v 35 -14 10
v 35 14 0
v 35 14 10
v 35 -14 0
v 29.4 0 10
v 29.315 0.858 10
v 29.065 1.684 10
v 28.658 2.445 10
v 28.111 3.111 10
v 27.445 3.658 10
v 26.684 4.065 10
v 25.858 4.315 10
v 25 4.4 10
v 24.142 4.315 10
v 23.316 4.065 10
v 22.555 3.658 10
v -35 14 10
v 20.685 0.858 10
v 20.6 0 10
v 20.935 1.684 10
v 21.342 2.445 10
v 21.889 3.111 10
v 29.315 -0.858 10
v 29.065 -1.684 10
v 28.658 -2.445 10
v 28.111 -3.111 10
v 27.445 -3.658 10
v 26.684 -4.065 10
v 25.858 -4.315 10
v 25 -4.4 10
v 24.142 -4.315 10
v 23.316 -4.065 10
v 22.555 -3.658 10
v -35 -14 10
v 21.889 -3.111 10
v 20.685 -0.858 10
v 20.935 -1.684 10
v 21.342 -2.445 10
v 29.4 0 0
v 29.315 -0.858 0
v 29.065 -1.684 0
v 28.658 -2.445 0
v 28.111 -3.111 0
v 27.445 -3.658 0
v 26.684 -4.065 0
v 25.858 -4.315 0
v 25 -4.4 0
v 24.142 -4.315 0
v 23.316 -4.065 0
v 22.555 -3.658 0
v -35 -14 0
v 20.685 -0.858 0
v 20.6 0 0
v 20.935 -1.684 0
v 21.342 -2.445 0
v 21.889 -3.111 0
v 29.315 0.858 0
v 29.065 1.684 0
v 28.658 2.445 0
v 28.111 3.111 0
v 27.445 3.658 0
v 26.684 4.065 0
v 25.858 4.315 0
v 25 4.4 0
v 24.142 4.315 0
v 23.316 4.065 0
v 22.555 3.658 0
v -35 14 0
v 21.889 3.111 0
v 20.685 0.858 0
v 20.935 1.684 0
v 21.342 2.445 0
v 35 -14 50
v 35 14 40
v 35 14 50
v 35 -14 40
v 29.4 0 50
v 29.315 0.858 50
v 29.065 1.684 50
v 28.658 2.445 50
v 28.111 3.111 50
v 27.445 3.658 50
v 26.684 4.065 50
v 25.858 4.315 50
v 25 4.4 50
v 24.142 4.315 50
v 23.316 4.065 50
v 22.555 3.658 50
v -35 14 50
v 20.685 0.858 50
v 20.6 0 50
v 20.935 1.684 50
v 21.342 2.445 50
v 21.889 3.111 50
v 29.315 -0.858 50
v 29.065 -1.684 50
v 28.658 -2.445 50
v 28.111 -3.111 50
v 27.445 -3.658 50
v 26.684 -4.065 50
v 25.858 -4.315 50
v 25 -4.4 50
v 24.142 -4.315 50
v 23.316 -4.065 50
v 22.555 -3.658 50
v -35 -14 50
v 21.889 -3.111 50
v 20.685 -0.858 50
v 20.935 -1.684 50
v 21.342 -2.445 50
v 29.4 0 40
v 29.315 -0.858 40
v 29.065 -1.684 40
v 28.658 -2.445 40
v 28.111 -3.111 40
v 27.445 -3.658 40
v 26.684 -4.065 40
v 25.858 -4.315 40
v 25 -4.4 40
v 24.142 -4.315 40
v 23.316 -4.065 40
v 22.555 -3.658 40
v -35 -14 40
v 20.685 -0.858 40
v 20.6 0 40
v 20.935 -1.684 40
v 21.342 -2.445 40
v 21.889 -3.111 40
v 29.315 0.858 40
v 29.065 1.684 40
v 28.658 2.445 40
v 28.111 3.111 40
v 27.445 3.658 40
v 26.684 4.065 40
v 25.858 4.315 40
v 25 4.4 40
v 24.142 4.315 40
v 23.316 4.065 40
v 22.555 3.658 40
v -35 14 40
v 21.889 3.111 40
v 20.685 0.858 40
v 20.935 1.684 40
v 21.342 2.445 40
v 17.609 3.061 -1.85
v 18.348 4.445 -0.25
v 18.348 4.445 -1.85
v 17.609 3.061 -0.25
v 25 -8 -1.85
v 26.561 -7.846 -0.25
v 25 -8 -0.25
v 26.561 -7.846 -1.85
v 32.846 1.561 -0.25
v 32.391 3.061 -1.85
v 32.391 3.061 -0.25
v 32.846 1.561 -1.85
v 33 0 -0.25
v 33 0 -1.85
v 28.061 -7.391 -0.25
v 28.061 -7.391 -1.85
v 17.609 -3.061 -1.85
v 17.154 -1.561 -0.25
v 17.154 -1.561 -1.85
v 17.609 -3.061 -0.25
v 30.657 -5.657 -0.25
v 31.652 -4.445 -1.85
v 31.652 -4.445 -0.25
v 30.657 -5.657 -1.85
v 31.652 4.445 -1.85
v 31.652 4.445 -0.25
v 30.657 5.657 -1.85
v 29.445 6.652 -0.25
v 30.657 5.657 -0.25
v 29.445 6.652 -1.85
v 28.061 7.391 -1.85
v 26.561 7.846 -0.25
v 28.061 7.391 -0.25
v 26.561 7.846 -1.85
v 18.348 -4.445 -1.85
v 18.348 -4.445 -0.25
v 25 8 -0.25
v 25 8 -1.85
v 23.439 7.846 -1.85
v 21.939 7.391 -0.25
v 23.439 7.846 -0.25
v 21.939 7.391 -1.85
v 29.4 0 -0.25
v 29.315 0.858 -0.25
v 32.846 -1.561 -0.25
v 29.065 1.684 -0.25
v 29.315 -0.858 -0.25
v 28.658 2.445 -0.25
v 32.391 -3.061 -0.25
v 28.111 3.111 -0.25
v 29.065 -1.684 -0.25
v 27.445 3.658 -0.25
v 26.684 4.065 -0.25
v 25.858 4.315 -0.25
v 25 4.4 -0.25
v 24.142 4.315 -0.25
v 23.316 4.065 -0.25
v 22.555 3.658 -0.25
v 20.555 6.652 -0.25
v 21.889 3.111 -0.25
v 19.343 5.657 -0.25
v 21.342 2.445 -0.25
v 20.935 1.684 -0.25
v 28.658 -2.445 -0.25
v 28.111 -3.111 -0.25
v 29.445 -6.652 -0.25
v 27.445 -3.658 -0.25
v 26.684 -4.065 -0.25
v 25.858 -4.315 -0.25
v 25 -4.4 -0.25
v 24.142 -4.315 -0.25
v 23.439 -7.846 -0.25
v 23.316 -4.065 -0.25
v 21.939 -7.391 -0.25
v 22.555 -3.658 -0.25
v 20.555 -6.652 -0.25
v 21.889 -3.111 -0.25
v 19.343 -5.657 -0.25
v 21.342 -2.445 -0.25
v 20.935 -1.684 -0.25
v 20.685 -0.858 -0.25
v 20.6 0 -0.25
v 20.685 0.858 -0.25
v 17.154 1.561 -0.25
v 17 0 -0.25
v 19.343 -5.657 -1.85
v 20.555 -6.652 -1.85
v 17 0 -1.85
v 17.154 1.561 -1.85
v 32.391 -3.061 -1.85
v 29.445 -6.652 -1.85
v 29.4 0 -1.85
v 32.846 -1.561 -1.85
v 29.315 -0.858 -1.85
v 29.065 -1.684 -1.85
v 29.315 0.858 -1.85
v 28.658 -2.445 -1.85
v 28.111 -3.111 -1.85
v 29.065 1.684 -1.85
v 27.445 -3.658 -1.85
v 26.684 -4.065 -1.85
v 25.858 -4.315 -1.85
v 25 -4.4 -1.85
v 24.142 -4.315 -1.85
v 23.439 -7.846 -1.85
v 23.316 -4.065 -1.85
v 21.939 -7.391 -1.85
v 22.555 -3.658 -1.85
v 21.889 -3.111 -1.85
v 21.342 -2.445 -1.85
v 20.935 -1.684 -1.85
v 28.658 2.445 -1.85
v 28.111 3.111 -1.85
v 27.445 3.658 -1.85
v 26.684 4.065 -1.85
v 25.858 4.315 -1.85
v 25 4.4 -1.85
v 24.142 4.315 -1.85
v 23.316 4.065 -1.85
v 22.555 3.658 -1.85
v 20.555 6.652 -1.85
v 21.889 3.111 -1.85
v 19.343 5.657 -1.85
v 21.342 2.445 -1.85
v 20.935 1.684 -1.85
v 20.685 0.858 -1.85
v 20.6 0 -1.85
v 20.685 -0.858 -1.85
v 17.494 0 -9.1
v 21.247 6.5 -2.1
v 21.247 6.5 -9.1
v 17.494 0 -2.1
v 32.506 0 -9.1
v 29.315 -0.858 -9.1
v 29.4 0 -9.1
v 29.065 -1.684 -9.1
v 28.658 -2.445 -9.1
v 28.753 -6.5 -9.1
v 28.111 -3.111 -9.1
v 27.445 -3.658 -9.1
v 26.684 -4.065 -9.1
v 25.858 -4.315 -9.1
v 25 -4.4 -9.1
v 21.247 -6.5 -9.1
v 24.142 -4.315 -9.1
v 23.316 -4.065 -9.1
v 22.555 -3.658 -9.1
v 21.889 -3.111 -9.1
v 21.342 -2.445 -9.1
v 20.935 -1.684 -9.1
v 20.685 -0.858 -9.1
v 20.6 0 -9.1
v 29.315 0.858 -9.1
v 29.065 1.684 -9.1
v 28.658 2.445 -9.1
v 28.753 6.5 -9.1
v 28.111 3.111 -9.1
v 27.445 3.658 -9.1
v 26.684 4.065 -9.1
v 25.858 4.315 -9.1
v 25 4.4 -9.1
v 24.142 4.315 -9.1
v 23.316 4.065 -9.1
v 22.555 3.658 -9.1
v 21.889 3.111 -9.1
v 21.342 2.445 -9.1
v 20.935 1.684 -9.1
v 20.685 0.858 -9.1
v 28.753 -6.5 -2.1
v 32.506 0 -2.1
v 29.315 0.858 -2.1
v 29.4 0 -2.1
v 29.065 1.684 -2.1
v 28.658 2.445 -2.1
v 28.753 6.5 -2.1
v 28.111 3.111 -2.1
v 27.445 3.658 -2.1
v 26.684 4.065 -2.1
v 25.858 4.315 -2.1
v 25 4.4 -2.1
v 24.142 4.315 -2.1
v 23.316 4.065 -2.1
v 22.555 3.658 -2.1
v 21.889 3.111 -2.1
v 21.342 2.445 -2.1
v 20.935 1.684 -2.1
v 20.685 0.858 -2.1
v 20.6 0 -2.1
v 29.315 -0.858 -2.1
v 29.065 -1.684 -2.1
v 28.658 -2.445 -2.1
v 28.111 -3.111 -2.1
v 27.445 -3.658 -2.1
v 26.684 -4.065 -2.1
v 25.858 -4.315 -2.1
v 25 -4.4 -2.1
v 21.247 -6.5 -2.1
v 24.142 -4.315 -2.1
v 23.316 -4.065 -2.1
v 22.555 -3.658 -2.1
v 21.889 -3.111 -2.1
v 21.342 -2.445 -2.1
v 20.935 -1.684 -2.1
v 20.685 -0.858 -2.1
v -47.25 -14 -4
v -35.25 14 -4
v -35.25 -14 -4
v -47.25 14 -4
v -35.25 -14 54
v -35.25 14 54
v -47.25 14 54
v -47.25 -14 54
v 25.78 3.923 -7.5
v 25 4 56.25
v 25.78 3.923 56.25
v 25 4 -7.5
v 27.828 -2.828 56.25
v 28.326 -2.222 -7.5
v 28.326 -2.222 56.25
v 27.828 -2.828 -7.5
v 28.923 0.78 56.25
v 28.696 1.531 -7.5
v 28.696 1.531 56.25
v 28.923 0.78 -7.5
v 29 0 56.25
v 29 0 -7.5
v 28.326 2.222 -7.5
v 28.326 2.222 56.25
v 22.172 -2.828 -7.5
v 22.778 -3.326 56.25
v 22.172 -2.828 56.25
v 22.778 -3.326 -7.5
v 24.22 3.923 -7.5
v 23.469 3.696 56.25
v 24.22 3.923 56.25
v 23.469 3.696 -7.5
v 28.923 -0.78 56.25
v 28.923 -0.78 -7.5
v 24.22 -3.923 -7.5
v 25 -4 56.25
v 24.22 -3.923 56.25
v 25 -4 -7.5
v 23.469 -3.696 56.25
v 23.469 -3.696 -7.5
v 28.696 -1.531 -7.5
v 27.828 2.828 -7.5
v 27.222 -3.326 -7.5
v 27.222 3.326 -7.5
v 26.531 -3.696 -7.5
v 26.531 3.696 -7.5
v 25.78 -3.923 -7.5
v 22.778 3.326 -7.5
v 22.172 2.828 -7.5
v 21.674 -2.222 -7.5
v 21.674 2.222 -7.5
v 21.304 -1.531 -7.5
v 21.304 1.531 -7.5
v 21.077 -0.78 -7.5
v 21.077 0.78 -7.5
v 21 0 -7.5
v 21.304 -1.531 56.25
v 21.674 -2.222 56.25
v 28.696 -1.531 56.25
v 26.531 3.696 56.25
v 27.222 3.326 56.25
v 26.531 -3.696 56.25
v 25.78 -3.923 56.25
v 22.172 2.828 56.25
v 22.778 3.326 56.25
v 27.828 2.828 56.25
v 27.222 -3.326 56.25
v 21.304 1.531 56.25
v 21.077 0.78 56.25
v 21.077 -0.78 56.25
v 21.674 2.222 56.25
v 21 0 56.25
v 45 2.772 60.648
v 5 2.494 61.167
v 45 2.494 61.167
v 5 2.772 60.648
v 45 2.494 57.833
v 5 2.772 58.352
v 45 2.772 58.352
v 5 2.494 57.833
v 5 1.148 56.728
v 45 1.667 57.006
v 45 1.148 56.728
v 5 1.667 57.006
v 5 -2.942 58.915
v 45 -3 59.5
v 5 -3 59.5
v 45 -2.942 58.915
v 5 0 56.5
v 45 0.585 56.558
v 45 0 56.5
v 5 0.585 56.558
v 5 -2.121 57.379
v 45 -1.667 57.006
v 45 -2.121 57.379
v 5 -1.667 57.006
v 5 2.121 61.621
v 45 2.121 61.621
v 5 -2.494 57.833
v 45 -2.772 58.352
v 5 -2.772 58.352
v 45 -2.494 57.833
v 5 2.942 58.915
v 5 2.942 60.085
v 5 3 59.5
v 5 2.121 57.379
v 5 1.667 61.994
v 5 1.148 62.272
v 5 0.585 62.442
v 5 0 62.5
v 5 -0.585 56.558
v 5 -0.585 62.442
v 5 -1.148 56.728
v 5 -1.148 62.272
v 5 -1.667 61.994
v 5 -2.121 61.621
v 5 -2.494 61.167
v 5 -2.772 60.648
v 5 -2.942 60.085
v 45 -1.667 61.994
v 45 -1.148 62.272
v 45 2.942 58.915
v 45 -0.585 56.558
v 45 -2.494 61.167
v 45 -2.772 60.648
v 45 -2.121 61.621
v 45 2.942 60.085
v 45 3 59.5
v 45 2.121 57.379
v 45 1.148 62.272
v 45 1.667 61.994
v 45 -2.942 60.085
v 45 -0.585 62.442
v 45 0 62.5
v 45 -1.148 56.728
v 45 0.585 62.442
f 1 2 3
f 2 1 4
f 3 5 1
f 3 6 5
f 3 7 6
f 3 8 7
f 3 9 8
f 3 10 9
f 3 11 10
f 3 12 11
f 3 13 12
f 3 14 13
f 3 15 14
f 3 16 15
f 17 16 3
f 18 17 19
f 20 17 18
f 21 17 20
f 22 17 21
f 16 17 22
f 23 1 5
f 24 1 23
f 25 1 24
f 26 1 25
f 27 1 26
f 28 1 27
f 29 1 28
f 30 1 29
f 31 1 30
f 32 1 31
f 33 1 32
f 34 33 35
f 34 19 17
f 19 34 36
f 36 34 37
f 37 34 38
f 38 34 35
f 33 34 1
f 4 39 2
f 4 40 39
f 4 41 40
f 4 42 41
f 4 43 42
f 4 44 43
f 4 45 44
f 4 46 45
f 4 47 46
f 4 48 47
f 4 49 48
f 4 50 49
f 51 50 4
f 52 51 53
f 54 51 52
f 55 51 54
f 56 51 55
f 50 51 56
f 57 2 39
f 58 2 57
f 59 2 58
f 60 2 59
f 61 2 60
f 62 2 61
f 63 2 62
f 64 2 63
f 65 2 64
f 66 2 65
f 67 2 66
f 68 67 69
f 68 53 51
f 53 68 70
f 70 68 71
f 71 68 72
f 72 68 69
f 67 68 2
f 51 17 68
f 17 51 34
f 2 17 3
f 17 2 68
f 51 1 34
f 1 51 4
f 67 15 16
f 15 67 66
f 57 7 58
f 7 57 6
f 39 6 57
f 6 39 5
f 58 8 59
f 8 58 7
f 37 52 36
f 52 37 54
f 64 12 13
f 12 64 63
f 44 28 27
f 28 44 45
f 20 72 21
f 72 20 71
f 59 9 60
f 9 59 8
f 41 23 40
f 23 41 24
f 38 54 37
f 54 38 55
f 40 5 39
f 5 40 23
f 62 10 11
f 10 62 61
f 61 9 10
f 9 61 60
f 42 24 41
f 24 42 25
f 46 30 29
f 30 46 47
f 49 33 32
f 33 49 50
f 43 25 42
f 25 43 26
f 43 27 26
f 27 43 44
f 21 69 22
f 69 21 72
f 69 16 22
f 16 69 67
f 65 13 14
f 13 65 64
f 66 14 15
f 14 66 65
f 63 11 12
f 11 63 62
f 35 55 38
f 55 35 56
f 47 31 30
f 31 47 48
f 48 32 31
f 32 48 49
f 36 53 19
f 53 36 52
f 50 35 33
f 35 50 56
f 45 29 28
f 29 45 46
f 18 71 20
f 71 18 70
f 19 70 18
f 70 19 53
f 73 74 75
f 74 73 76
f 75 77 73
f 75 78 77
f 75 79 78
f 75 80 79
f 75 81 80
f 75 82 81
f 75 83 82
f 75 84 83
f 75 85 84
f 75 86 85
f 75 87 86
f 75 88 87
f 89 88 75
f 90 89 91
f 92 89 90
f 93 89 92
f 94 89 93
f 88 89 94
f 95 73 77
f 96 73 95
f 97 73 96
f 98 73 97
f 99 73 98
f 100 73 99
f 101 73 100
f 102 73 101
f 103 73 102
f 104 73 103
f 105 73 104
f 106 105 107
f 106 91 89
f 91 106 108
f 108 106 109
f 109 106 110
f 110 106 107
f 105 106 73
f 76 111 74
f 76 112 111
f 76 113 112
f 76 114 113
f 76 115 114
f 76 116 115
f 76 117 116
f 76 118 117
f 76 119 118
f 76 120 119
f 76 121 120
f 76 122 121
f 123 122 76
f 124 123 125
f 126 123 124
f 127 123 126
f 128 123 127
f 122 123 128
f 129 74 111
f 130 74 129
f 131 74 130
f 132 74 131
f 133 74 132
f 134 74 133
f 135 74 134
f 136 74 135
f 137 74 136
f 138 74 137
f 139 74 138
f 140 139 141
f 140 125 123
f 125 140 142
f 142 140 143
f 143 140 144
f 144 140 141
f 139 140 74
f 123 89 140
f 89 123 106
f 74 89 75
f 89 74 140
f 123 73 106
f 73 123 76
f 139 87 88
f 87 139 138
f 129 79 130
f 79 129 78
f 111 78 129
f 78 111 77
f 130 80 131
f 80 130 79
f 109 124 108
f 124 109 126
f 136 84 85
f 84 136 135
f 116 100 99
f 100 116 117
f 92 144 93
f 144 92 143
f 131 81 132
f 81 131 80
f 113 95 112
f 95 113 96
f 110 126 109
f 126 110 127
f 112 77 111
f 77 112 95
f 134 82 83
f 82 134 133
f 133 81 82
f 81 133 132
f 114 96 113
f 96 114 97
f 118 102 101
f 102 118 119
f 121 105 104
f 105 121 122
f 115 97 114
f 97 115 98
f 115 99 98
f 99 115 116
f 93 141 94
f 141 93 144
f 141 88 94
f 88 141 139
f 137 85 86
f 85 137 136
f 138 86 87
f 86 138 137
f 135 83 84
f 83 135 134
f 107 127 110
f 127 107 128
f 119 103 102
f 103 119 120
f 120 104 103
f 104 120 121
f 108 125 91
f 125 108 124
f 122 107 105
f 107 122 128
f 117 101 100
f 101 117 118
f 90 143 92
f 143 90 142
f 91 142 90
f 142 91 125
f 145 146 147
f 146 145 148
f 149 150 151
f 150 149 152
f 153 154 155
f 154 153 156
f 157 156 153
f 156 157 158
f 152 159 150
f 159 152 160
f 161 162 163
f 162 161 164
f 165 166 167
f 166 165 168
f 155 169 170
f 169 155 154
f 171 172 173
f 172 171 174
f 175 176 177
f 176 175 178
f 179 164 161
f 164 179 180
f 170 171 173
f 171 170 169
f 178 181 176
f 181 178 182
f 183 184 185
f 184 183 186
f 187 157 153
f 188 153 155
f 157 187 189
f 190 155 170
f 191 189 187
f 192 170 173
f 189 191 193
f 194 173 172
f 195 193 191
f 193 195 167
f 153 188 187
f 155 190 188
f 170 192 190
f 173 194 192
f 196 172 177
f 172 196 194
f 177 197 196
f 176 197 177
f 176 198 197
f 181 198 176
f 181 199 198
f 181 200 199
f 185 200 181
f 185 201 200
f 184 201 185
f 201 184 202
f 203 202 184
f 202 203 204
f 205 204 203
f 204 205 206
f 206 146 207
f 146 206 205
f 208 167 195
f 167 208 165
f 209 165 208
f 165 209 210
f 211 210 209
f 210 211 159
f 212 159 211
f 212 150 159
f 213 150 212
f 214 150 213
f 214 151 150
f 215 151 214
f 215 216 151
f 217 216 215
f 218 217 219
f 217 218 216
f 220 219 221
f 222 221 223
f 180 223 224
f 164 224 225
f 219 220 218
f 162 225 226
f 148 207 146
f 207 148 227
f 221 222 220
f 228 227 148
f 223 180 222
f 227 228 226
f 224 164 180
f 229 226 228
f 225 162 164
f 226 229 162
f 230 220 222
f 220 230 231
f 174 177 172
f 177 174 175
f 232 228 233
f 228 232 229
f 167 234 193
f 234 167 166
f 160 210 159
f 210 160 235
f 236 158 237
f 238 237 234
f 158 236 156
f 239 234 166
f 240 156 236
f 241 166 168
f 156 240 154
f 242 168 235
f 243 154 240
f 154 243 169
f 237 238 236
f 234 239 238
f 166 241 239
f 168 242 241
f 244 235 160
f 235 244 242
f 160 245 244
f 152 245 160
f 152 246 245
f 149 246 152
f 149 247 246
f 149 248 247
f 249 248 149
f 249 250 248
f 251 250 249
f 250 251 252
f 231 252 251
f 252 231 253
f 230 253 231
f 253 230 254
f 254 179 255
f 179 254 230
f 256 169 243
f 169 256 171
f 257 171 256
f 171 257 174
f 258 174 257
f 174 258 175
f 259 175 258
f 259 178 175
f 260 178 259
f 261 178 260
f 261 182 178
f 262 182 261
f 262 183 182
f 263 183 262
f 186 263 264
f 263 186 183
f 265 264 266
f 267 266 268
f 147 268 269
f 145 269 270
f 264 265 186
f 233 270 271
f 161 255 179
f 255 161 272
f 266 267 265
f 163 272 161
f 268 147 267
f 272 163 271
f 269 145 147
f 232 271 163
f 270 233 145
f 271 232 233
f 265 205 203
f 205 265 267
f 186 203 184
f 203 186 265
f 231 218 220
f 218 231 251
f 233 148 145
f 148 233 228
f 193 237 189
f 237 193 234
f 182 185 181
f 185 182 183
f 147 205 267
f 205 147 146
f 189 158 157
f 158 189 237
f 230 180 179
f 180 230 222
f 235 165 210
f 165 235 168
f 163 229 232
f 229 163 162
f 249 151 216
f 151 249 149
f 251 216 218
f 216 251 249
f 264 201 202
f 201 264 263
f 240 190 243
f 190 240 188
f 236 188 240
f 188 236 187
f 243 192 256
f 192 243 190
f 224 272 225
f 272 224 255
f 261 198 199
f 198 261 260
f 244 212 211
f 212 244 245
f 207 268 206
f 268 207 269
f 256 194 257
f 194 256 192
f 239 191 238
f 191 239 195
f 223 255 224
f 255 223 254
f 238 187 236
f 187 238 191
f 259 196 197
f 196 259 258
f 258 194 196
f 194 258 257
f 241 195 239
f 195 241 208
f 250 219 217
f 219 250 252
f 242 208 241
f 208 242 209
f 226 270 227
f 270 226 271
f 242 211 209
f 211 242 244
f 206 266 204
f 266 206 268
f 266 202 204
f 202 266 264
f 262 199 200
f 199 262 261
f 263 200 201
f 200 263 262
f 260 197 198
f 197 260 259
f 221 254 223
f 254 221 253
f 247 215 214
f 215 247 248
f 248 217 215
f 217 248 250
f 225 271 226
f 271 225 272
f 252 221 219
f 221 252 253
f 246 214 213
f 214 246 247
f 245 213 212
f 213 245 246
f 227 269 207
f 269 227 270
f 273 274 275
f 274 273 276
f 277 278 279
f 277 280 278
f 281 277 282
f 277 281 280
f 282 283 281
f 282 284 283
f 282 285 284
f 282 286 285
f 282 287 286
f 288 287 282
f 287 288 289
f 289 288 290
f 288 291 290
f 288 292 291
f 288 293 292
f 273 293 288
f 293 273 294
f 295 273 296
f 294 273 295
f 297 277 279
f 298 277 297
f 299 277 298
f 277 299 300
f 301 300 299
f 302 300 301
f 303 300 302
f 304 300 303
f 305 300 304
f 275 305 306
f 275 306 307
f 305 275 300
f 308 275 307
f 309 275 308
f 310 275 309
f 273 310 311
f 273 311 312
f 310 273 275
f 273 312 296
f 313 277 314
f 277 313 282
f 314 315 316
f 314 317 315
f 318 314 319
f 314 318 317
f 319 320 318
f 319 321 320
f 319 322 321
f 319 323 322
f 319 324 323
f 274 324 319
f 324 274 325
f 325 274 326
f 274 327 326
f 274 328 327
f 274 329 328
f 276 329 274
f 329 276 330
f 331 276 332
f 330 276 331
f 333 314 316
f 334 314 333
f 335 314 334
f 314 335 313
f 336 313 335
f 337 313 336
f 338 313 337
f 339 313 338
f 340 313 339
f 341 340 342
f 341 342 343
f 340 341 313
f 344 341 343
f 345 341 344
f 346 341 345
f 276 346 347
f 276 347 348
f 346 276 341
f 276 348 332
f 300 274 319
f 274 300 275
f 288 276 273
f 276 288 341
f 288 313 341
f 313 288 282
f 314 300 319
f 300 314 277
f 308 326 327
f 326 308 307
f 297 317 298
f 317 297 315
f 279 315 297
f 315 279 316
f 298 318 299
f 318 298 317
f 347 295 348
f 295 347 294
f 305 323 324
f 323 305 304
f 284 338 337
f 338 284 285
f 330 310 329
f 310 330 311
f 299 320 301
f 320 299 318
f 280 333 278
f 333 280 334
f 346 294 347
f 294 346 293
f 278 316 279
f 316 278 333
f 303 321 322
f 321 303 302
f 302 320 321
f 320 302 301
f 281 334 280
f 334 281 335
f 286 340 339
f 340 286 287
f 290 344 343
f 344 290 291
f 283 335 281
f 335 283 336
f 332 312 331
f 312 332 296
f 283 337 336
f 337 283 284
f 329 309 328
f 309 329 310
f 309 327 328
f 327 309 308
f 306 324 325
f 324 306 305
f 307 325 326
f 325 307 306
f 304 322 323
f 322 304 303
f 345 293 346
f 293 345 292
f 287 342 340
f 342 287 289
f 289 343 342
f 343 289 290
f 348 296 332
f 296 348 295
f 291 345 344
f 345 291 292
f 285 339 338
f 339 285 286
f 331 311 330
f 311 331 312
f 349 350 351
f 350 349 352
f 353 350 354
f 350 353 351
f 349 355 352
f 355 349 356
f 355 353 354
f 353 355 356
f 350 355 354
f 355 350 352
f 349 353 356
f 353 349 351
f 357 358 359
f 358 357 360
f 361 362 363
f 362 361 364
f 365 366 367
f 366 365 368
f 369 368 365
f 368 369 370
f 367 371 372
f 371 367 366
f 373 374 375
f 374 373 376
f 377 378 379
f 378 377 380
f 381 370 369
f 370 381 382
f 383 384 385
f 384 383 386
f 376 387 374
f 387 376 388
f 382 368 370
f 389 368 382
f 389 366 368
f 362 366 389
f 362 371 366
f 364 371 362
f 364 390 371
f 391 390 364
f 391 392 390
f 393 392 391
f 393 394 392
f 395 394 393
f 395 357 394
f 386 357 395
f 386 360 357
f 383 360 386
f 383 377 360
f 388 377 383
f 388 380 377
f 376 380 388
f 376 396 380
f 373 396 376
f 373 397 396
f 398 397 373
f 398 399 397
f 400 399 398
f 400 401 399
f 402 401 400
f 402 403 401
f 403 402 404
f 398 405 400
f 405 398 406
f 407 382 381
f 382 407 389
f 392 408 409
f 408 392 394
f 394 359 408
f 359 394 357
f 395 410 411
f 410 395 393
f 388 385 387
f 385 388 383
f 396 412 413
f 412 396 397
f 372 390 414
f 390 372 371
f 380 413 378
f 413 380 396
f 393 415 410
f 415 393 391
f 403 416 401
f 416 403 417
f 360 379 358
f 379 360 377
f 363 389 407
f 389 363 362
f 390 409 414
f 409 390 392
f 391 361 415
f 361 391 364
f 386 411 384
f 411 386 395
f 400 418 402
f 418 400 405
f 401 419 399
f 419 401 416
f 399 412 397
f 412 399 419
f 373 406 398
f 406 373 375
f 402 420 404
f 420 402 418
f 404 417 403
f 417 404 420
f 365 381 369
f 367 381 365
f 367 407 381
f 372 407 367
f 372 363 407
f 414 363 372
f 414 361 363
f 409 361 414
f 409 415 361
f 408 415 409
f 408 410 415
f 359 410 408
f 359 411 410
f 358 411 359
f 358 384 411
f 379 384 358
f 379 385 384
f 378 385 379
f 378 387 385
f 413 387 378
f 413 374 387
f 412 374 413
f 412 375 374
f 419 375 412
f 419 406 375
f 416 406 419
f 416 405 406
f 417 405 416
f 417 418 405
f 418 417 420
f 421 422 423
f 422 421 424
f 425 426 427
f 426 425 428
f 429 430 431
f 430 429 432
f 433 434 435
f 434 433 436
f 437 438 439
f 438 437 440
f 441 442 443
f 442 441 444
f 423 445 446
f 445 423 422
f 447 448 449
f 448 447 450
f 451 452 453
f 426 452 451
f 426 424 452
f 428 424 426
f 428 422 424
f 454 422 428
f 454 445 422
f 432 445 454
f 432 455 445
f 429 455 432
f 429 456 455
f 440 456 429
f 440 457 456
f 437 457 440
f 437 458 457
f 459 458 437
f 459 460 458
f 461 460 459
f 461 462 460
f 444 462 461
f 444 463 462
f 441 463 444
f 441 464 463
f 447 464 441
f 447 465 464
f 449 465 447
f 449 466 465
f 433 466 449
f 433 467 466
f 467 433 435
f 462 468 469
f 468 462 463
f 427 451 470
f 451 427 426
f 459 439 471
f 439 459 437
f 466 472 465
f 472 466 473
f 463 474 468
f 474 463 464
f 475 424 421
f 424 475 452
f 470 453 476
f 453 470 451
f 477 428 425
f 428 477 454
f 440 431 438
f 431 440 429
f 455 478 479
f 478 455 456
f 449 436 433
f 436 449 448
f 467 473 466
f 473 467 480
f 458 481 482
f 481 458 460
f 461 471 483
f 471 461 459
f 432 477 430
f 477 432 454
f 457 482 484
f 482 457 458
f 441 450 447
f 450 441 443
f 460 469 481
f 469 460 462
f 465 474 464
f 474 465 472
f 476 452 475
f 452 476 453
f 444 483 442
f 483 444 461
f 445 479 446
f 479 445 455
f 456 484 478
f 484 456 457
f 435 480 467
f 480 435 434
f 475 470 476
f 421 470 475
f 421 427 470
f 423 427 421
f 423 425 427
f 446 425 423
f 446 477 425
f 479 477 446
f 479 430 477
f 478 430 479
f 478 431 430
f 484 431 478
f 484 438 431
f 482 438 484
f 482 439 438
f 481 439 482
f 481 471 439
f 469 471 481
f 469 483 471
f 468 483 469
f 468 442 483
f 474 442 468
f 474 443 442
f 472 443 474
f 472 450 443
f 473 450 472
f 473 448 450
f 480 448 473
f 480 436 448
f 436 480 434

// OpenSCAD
$fn = 32;

// ------------------------------------------------------------------------
// C clamp: throat 40 mm, screw d8
// Every part is its own module, assembly() places every instance.
// ------------------------------------------------------------------------

// --- part 1 ---
module clamp_arm() {
  difference() {
    translate([-35, -14, 0]) cube([70, 28, 10]);
    translate([25, 0, -1]) cylinder(h = 12, d = 8.8);
  }
}

// --- part 2 ---
module clamp_spine() {
  difference() {
    translate([-29, -14, 0]) cube([58, 28, 12]);
  }
}

// --- part 3 ---
module clamp_screw() {
  translate([0, 0, -31.875]) cylinder(h = 63.75, d = 8);
}

// --- part 4 ---
module clamp_washer() {
  difference() {
      translate([0, 0, 0]) cylinder(h = 1.6, d = 16);
      translate([0, 0, -1]) cylinder(h = 3.6, d = 8.8);
    }
}

// --- part 5 ---
module clamp_nut() {
  difference() {
    linear_extrude(height = 7) polygon(points = [[7.506, 0], [3.753, 6.5], [-3.753, 6.5], [-7.506, 0], [-3.753, -6.5], [3.753, -6.5]]);
    translate([0, 0, -1]) cylinder(h = 9, d = 8.8);
  }
}

// --- part 6 ---
module tommy_bar() {
  translate([0, 0, -20]) cylinder(h = 40, d = 6);
}

// --- assembly ---
module assembly() {
  color([0.80, 0.24, 0.20]) translate([0, 0, 0]) rotate([0, 0, 0]) clamp_arm();
  color([0.20, 0.45, 0.75]) translate([0, 0, 40]) rotate([0, 0, 0]) clamp_arm();
  color([0.25, 0.62, 0.32]) translate([-47.25, 0, 25]) rotate([0, 90, 0]) clamp_spine();
  color([0.92, 0.70, 0.18]) translate([25, 0, 24.375]) rotate([0, 0, 0]) clamp_screw();
  color([0.58, 0.35, 0.70]) translate([25, 0, -1.85]) rotate([0, 0, 0]) clamp_washer();
  color([0.16, 0.66, 0.66]) translate([25, 0, -9.1]) rotate([0, 0, 0]) clamp_nut();
  color([0.85, 0.48, 0.18]) translate([25, 0, 59.5]) rotate([0, 90, 0]) tommy_bar();
}

assembly();
